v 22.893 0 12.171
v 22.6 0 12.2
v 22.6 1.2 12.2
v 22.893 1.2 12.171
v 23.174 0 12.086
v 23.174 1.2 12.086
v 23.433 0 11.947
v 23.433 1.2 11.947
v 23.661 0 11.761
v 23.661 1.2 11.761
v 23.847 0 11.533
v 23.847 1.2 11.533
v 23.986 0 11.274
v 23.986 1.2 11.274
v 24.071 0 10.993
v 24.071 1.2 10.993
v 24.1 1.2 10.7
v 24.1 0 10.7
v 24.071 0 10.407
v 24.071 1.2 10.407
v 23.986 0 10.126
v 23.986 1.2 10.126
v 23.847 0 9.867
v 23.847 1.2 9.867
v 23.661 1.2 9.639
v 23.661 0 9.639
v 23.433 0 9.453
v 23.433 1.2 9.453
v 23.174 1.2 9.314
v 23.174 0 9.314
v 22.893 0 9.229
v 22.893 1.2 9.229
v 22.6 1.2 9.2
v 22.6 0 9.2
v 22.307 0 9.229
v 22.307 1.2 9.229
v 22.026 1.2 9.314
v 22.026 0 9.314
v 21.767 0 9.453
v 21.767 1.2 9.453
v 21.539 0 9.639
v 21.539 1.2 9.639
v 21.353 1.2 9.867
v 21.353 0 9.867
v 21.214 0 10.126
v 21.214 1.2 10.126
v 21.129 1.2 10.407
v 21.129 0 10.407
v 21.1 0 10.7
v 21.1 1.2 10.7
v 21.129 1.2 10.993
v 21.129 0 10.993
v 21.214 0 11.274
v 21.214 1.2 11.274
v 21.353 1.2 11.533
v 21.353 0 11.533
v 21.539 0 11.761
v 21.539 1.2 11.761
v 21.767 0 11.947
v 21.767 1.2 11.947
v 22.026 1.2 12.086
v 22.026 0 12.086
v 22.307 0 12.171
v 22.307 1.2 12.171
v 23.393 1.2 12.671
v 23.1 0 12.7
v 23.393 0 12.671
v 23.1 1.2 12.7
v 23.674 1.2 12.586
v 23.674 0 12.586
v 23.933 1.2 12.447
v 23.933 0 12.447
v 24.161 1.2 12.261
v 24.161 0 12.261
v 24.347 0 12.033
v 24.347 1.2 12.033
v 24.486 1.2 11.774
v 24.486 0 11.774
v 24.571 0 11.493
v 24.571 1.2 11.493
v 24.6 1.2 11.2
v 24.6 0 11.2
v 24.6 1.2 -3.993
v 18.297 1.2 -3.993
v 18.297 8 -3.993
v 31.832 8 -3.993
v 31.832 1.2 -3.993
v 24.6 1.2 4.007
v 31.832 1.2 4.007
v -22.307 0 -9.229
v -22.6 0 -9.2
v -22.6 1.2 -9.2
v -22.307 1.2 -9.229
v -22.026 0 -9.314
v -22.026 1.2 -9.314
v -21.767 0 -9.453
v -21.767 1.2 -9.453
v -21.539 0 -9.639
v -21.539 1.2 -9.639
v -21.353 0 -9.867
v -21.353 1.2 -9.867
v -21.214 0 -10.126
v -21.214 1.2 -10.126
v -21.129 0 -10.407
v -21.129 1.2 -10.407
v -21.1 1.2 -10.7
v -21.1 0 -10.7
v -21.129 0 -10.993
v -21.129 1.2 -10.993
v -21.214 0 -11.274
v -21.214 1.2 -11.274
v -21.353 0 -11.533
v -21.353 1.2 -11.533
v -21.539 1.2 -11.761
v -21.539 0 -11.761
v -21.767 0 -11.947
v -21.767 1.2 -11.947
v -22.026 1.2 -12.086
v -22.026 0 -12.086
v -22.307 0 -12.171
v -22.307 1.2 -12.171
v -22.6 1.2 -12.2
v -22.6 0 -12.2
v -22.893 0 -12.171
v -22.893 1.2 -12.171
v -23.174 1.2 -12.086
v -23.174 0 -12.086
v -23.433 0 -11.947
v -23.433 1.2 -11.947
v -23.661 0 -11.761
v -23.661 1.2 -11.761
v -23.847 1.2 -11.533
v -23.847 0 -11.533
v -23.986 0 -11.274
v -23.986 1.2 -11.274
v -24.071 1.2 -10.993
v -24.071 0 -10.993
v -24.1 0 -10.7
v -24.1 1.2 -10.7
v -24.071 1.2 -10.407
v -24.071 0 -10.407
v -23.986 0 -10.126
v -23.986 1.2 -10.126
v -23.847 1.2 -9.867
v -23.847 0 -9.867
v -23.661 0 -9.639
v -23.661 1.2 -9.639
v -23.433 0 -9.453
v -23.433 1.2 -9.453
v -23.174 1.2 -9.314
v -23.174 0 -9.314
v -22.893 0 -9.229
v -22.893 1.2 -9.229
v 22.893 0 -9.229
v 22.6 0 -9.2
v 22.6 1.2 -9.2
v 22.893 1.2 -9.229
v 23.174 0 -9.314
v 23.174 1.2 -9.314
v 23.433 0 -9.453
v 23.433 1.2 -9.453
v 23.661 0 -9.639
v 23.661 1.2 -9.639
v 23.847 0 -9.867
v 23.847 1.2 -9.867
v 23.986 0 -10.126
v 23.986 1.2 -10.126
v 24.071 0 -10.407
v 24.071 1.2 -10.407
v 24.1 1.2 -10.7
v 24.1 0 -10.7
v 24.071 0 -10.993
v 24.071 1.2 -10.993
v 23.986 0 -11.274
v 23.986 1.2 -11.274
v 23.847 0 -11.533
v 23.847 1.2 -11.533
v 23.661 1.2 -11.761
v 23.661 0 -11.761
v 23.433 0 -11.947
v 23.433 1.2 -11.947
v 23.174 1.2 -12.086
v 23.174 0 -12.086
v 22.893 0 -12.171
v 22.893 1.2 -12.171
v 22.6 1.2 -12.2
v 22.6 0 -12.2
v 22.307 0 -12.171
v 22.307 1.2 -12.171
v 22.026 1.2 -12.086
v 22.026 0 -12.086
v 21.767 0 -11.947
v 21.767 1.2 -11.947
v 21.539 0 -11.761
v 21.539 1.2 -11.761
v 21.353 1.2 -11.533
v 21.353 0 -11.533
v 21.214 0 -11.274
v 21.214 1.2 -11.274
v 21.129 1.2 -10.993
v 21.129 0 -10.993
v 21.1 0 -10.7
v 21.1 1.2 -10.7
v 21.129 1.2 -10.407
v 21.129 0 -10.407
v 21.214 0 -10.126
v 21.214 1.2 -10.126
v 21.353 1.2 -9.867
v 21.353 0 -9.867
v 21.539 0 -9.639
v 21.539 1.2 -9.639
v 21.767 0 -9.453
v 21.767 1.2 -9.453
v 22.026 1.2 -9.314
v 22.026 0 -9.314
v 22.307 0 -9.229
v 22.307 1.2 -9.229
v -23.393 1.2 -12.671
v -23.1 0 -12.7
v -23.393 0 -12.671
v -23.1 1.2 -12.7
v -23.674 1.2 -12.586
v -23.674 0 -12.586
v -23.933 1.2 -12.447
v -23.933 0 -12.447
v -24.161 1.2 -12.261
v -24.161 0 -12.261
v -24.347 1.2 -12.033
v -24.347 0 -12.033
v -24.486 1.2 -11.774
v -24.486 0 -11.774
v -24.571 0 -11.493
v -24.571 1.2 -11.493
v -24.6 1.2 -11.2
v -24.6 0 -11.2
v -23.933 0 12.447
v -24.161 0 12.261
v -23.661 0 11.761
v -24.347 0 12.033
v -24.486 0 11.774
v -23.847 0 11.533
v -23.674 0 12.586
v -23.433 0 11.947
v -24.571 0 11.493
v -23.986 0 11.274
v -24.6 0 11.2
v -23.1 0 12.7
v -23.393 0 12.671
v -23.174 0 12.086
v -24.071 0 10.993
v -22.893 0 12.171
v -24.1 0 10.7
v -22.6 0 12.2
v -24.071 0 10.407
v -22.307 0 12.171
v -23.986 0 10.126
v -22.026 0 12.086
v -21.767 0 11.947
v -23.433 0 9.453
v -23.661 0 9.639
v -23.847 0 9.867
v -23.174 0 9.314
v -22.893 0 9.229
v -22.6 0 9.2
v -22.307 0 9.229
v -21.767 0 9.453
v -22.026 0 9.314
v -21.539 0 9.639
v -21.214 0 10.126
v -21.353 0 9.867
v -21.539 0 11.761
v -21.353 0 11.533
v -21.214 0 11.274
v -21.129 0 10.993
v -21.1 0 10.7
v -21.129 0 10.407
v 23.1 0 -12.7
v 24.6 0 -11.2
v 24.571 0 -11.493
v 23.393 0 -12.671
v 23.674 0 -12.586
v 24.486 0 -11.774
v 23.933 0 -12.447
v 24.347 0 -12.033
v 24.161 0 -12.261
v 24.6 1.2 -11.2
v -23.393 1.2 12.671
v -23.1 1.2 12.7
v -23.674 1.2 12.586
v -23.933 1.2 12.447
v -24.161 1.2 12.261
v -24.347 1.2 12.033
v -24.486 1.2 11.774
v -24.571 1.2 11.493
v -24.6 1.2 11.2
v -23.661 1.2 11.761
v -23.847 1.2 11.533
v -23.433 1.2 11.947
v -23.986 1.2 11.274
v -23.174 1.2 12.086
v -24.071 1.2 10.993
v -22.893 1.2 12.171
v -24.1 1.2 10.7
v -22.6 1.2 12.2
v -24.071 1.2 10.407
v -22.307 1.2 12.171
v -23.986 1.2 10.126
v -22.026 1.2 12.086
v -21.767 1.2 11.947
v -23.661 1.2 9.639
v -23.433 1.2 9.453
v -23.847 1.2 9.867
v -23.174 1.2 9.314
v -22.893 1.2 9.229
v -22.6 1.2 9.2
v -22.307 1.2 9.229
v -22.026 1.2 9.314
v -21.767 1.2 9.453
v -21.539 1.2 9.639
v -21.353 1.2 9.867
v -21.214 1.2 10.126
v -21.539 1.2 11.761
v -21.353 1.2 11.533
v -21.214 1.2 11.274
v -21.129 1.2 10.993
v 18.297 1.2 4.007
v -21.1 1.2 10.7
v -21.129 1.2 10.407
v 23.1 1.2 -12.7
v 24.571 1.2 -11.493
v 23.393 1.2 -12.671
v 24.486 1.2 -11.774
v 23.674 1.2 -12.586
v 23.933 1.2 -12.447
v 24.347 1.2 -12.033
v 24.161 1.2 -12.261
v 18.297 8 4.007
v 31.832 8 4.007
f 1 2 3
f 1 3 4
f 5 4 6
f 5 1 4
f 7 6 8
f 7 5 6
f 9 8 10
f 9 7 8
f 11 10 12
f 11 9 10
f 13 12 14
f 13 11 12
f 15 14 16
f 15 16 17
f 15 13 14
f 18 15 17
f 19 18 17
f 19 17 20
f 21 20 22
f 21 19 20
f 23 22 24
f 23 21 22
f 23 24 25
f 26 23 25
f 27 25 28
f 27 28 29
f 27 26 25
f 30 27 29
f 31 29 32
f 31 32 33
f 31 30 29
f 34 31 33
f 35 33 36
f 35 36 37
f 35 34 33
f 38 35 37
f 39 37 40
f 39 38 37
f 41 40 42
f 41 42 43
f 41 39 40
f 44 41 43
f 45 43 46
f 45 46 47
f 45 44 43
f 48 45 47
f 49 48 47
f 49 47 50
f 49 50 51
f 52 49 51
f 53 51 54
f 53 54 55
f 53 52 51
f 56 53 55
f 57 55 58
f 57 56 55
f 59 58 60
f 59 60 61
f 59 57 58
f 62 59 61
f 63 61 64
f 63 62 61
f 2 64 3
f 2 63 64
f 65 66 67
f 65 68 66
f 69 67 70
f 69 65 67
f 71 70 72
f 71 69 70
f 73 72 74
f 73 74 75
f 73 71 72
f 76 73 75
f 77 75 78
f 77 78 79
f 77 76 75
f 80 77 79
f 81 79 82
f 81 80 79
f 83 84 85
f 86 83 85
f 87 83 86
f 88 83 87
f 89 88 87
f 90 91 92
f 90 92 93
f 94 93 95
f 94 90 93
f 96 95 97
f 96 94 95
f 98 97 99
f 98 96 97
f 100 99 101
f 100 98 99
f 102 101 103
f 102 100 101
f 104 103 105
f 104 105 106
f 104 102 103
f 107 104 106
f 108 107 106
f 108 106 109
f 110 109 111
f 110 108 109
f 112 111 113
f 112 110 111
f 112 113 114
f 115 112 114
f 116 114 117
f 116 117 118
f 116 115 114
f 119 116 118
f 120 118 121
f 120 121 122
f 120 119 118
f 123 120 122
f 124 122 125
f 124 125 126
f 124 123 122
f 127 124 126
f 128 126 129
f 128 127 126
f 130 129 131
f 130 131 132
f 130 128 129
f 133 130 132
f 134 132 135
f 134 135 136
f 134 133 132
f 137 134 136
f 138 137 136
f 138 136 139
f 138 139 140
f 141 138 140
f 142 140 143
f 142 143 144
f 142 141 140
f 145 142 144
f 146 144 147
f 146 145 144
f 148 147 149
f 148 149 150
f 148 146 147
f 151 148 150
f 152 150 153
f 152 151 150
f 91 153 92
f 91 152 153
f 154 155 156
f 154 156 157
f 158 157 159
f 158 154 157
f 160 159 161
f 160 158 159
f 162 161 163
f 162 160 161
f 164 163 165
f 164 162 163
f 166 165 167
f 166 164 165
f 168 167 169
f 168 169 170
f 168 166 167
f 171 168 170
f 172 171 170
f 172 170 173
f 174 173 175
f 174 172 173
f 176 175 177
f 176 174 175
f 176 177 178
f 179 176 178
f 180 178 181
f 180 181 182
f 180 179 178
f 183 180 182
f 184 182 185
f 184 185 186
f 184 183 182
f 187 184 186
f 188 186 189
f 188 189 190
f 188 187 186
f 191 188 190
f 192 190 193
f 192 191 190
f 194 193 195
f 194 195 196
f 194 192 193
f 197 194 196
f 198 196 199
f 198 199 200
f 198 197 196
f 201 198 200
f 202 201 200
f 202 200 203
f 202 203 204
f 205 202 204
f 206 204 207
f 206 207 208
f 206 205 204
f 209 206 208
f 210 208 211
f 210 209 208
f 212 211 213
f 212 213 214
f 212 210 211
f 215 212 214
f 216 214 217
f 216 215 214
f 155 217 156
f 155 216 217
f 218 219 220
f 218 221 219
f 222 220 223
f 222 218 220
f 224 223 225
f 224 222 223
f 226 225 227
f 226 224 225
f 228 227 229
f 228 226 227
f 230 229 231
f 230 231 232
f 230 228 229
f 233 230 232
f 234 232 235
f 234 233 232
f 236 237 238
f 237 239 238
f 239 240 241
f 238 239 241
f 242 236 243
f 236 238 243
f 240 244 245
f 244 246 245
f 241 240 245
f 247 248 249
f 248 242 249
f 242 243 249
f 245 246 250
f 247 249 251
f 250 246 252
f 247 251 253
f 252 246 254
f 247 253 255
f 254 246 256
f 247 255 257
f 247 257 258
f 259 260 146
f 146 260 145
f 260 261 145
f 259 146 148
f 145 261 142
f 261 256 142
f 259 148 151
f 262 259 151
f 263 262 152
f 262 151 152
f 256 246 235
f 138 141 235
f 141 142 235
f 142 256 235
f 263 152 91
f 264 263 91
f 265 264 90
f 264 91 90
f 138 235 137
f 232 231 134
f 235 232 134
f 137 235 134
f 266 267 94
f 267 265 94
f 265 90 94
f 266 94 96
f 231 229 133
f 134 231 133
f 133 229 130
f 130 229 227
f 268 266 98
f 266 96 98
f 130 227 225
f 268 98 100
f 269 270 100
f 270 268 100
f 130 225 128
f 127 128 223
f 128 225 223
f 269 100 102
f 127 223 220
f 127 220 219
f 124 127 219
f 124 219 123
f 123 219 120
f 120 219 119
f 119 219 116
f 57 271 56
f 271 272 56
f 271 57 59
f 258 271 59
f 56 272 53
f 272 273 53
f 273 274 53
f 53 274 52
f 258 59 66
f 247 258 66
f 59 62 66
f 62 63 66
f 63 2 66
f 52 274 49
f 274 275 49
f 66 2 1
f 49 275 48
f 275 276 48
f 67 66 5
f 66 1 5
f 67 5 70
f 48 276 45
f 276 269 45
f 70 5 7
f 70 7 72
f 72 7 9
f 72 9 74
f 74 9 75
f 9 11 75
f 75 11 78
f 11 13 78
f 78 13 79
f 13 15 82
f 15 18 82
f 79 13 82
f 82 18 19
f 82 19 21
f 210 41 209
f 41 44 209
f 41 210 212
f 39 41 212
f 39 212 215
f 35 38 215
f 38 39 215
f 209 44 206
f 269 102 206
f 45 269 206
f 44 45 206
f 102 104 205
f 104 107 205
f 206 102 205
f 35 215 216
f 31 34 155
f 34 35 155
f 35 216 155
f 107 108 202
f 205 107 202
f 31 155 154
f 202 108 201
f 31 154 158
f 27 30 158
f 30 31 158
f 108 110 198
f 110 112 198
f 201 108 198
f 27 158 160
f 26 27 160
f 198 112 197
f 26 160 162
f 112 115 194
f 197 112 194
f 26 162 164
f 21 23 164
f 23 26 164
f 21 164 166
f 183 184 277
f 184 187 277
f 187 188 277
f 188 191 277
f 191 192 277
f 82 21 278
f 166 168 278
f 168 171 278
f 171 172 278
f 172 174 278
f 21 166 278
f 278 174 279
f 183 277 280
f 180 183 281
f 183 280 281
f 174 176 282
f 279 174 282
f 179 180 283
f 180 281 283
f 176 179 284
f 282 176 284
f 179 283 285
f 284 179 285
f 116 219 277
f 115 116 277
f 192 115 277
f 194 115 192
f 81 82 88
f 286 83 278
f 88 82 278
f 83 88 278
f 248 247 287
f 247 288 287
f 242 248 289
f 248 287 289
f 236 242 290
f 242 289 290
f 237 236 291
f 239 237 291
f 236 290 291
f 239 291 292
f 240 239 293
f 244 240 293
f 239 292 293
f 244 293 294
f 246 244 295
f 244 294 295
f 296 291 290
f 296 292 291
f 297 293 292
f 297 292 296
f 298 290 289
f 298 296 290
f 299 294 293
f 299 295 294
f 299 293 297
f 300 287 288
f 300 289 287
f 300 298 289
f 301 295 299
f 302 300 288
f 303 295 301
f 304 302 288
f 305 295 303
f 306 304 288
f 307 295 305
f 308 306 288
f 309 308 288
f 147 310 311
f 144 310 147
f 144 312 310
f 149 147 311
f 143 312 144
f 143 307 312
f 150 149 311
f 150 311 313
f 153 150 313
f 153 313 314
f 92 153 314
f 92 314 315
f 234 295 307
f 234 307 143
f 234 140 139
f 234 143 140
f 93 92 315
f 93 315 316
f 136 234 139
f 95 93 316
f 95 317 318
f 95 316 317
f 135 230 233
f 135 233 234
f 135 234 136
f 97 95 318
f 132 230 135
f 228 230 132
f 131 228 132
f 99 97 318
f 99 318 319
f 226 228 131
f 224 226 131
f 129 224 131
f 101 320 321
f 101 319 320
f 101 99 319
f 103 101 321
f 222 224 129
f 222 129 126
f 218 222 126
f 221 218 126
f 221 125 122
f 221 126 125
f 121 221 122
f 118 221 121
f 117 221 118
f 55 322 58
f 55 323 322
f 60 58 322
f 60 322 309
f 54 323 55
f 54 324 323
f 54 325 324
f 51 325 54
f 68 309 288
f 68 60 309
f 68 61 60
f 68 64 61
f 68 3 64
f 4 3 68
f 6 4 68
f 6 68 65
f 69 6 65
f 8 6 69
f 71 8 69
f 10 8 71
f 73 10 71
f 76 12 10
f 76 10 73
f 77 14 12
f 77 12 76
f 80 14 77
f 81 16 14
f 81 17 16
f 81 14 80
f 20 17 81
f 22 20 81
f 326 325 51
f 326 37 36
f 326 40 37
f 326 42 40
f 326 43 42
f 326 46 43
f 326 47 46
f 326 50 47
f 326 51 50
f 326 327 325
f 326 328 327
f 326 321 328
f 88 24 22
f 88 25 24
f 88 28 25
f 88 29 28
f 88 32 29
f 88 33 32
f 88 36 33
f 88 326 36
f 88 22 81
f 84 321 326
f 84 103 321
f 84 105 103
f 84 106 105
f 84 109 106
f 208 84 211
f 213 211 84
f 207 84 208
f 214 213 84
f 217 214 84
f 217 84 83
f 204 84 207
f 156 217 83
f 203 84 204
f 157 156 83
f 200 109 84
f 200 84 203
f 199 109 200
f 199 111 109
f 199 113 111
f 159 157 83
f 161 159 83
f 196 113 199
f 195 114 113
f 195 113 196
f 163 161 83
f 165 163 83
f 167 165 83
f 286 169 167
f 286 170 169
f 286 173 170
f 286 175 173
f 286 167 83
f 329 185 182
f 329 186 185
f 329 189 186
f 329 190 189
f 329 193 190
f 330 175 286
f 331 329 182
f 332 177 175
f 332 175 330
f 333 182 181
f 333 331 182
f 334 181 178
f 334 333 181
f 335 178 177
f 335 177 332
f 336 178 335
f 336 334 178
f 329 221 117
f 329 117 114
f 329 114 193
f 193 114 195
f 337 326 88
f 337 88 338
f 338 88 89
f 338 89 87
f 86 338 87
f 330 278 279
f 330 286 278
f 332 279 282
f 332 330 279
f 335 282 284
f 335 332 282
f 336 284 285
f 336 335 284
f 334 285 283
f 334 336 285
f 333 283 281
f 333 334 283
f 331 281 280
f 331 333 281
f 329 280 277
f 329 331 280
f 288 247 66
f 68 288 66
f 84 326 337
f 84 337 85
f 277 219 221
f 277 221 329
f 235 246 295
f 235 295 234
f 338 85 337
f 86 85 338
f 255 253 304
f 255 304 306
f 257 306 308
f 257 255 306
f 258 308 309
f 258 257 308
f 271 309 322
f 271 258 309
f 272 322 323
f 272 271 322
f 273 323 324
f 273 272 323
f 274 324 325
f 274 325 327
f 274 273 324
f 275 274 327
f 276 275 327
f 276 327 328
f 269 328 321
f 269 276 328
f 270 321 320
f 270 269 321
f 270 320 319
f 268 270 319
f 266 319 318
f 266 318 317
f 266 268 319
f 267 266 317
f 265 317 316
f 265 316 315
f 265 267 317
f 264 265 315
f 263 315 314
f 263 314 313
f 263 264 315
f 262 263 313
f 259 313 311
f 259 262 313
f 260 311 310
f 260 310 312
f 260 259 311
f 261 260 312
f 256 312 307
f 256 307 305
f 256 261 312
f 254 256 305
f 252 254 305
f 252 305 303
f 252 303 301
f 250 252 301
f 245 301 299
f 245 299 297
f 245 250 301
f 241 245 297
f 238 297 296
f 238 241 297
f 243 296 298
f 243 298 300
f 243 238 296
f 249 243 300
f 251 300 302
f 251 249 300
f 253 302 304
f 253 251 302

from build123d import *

# Parameters (mm, degrees)
ESQUISSE1_W        = 49.2
ESQUISSE1_H        = 25.4
ESQUISSE1_R        = 1.5
BOSS_EXTRU_1_DEPTH = 1.2
CONG_1_R           = 1.5
CONG_2_R           = 1.5
CONG_3_R           = 1.5
CONG_4_R           = 1.5
ESQUISSE3_W        = 13.534356754
ESQUISSE3_H        = 8
BOSS_EXTRU_2_DEPTH = 6.8


with BuildPart() as part:
    # Esquisse1 → Boss.-Extru.1 (new body)
    with BuildSketch(Plane(origin=(0, 0, 0), x_dir=(1, 0, 0), z_dir=(0, 1, 0))):
        Rectangle(ESQUISSE1_W, ESQUISSE1_H)
        with Locations(Location((22.6, 10.7, 0), (0, 0, 270))):
            Circle(ESQUISSE1_R, mode=Mode.SUBTRACT)
        with Locations(Location((22.6, -10.7, 0), (0, 0, 270))):
            Circle(ESQUISSE1_R, mode=Mode.SUBTRACT)
        with Locations(Location((-22.6, -10.7, 0), (0, 0, 270))):
            Circle(ESQUISSE1_R, mode=Mode.SUBTRACT)
        with Locations(Location((-22.6, 10.7, 0), (0, 0, 270))):
            Circle(ESQUISSE1_R, mode=Mode.SUBTRACT)
    extrude(amount=BOSS_EXTRU_1_DEPTH)

    # Congé1
    cong_1_edges = [part.edges().sort_by_distance(p)[0] for p in [
        (24.6, 0.6, 12.7),
    ]]
    fillet(cong_1_edges, radius=CONG_1_R)

    # Congé2
    cong_2_edges = [part.edges().sort_by_distance(p)[0] for p in [
        (-24.6, 0.6, 12.7),
    ]]
    fillet(cong_2_edges, radius=CONG_2_R)

    # Congé3
    cong_3_edges = [part.edges().sort_by_distance(p)[0] for p in [
        (24.6, 0.6, -12.7),
    ]]
    fillet(cong_3_edges, radius=CONG_3_R)

    # Congé4
    cong_4_edges = [part.edges().sort_by_distance(p)[0] for p in [
        (-24.6, 0.6, -12.7),
    ]]
    fillet(cong_4_edges, radius=CONG_4_R)

    # Esquisse3 → Boss.-Extru.2 (add)
    with BuildSketch(Plane(origin=(1.430842634, 1.2, 0.935550953), x_dir=(1, 0, 0), z_dir=(0, 1, 0))):
        with Locations((23.633586999, 0.928816864)):
            Rectangle(ESQUISSE3_W, ESQUISSE3_H)
    extrude(amount=BOSS_EXTRU_2_DEPTH)


solid = part.part
